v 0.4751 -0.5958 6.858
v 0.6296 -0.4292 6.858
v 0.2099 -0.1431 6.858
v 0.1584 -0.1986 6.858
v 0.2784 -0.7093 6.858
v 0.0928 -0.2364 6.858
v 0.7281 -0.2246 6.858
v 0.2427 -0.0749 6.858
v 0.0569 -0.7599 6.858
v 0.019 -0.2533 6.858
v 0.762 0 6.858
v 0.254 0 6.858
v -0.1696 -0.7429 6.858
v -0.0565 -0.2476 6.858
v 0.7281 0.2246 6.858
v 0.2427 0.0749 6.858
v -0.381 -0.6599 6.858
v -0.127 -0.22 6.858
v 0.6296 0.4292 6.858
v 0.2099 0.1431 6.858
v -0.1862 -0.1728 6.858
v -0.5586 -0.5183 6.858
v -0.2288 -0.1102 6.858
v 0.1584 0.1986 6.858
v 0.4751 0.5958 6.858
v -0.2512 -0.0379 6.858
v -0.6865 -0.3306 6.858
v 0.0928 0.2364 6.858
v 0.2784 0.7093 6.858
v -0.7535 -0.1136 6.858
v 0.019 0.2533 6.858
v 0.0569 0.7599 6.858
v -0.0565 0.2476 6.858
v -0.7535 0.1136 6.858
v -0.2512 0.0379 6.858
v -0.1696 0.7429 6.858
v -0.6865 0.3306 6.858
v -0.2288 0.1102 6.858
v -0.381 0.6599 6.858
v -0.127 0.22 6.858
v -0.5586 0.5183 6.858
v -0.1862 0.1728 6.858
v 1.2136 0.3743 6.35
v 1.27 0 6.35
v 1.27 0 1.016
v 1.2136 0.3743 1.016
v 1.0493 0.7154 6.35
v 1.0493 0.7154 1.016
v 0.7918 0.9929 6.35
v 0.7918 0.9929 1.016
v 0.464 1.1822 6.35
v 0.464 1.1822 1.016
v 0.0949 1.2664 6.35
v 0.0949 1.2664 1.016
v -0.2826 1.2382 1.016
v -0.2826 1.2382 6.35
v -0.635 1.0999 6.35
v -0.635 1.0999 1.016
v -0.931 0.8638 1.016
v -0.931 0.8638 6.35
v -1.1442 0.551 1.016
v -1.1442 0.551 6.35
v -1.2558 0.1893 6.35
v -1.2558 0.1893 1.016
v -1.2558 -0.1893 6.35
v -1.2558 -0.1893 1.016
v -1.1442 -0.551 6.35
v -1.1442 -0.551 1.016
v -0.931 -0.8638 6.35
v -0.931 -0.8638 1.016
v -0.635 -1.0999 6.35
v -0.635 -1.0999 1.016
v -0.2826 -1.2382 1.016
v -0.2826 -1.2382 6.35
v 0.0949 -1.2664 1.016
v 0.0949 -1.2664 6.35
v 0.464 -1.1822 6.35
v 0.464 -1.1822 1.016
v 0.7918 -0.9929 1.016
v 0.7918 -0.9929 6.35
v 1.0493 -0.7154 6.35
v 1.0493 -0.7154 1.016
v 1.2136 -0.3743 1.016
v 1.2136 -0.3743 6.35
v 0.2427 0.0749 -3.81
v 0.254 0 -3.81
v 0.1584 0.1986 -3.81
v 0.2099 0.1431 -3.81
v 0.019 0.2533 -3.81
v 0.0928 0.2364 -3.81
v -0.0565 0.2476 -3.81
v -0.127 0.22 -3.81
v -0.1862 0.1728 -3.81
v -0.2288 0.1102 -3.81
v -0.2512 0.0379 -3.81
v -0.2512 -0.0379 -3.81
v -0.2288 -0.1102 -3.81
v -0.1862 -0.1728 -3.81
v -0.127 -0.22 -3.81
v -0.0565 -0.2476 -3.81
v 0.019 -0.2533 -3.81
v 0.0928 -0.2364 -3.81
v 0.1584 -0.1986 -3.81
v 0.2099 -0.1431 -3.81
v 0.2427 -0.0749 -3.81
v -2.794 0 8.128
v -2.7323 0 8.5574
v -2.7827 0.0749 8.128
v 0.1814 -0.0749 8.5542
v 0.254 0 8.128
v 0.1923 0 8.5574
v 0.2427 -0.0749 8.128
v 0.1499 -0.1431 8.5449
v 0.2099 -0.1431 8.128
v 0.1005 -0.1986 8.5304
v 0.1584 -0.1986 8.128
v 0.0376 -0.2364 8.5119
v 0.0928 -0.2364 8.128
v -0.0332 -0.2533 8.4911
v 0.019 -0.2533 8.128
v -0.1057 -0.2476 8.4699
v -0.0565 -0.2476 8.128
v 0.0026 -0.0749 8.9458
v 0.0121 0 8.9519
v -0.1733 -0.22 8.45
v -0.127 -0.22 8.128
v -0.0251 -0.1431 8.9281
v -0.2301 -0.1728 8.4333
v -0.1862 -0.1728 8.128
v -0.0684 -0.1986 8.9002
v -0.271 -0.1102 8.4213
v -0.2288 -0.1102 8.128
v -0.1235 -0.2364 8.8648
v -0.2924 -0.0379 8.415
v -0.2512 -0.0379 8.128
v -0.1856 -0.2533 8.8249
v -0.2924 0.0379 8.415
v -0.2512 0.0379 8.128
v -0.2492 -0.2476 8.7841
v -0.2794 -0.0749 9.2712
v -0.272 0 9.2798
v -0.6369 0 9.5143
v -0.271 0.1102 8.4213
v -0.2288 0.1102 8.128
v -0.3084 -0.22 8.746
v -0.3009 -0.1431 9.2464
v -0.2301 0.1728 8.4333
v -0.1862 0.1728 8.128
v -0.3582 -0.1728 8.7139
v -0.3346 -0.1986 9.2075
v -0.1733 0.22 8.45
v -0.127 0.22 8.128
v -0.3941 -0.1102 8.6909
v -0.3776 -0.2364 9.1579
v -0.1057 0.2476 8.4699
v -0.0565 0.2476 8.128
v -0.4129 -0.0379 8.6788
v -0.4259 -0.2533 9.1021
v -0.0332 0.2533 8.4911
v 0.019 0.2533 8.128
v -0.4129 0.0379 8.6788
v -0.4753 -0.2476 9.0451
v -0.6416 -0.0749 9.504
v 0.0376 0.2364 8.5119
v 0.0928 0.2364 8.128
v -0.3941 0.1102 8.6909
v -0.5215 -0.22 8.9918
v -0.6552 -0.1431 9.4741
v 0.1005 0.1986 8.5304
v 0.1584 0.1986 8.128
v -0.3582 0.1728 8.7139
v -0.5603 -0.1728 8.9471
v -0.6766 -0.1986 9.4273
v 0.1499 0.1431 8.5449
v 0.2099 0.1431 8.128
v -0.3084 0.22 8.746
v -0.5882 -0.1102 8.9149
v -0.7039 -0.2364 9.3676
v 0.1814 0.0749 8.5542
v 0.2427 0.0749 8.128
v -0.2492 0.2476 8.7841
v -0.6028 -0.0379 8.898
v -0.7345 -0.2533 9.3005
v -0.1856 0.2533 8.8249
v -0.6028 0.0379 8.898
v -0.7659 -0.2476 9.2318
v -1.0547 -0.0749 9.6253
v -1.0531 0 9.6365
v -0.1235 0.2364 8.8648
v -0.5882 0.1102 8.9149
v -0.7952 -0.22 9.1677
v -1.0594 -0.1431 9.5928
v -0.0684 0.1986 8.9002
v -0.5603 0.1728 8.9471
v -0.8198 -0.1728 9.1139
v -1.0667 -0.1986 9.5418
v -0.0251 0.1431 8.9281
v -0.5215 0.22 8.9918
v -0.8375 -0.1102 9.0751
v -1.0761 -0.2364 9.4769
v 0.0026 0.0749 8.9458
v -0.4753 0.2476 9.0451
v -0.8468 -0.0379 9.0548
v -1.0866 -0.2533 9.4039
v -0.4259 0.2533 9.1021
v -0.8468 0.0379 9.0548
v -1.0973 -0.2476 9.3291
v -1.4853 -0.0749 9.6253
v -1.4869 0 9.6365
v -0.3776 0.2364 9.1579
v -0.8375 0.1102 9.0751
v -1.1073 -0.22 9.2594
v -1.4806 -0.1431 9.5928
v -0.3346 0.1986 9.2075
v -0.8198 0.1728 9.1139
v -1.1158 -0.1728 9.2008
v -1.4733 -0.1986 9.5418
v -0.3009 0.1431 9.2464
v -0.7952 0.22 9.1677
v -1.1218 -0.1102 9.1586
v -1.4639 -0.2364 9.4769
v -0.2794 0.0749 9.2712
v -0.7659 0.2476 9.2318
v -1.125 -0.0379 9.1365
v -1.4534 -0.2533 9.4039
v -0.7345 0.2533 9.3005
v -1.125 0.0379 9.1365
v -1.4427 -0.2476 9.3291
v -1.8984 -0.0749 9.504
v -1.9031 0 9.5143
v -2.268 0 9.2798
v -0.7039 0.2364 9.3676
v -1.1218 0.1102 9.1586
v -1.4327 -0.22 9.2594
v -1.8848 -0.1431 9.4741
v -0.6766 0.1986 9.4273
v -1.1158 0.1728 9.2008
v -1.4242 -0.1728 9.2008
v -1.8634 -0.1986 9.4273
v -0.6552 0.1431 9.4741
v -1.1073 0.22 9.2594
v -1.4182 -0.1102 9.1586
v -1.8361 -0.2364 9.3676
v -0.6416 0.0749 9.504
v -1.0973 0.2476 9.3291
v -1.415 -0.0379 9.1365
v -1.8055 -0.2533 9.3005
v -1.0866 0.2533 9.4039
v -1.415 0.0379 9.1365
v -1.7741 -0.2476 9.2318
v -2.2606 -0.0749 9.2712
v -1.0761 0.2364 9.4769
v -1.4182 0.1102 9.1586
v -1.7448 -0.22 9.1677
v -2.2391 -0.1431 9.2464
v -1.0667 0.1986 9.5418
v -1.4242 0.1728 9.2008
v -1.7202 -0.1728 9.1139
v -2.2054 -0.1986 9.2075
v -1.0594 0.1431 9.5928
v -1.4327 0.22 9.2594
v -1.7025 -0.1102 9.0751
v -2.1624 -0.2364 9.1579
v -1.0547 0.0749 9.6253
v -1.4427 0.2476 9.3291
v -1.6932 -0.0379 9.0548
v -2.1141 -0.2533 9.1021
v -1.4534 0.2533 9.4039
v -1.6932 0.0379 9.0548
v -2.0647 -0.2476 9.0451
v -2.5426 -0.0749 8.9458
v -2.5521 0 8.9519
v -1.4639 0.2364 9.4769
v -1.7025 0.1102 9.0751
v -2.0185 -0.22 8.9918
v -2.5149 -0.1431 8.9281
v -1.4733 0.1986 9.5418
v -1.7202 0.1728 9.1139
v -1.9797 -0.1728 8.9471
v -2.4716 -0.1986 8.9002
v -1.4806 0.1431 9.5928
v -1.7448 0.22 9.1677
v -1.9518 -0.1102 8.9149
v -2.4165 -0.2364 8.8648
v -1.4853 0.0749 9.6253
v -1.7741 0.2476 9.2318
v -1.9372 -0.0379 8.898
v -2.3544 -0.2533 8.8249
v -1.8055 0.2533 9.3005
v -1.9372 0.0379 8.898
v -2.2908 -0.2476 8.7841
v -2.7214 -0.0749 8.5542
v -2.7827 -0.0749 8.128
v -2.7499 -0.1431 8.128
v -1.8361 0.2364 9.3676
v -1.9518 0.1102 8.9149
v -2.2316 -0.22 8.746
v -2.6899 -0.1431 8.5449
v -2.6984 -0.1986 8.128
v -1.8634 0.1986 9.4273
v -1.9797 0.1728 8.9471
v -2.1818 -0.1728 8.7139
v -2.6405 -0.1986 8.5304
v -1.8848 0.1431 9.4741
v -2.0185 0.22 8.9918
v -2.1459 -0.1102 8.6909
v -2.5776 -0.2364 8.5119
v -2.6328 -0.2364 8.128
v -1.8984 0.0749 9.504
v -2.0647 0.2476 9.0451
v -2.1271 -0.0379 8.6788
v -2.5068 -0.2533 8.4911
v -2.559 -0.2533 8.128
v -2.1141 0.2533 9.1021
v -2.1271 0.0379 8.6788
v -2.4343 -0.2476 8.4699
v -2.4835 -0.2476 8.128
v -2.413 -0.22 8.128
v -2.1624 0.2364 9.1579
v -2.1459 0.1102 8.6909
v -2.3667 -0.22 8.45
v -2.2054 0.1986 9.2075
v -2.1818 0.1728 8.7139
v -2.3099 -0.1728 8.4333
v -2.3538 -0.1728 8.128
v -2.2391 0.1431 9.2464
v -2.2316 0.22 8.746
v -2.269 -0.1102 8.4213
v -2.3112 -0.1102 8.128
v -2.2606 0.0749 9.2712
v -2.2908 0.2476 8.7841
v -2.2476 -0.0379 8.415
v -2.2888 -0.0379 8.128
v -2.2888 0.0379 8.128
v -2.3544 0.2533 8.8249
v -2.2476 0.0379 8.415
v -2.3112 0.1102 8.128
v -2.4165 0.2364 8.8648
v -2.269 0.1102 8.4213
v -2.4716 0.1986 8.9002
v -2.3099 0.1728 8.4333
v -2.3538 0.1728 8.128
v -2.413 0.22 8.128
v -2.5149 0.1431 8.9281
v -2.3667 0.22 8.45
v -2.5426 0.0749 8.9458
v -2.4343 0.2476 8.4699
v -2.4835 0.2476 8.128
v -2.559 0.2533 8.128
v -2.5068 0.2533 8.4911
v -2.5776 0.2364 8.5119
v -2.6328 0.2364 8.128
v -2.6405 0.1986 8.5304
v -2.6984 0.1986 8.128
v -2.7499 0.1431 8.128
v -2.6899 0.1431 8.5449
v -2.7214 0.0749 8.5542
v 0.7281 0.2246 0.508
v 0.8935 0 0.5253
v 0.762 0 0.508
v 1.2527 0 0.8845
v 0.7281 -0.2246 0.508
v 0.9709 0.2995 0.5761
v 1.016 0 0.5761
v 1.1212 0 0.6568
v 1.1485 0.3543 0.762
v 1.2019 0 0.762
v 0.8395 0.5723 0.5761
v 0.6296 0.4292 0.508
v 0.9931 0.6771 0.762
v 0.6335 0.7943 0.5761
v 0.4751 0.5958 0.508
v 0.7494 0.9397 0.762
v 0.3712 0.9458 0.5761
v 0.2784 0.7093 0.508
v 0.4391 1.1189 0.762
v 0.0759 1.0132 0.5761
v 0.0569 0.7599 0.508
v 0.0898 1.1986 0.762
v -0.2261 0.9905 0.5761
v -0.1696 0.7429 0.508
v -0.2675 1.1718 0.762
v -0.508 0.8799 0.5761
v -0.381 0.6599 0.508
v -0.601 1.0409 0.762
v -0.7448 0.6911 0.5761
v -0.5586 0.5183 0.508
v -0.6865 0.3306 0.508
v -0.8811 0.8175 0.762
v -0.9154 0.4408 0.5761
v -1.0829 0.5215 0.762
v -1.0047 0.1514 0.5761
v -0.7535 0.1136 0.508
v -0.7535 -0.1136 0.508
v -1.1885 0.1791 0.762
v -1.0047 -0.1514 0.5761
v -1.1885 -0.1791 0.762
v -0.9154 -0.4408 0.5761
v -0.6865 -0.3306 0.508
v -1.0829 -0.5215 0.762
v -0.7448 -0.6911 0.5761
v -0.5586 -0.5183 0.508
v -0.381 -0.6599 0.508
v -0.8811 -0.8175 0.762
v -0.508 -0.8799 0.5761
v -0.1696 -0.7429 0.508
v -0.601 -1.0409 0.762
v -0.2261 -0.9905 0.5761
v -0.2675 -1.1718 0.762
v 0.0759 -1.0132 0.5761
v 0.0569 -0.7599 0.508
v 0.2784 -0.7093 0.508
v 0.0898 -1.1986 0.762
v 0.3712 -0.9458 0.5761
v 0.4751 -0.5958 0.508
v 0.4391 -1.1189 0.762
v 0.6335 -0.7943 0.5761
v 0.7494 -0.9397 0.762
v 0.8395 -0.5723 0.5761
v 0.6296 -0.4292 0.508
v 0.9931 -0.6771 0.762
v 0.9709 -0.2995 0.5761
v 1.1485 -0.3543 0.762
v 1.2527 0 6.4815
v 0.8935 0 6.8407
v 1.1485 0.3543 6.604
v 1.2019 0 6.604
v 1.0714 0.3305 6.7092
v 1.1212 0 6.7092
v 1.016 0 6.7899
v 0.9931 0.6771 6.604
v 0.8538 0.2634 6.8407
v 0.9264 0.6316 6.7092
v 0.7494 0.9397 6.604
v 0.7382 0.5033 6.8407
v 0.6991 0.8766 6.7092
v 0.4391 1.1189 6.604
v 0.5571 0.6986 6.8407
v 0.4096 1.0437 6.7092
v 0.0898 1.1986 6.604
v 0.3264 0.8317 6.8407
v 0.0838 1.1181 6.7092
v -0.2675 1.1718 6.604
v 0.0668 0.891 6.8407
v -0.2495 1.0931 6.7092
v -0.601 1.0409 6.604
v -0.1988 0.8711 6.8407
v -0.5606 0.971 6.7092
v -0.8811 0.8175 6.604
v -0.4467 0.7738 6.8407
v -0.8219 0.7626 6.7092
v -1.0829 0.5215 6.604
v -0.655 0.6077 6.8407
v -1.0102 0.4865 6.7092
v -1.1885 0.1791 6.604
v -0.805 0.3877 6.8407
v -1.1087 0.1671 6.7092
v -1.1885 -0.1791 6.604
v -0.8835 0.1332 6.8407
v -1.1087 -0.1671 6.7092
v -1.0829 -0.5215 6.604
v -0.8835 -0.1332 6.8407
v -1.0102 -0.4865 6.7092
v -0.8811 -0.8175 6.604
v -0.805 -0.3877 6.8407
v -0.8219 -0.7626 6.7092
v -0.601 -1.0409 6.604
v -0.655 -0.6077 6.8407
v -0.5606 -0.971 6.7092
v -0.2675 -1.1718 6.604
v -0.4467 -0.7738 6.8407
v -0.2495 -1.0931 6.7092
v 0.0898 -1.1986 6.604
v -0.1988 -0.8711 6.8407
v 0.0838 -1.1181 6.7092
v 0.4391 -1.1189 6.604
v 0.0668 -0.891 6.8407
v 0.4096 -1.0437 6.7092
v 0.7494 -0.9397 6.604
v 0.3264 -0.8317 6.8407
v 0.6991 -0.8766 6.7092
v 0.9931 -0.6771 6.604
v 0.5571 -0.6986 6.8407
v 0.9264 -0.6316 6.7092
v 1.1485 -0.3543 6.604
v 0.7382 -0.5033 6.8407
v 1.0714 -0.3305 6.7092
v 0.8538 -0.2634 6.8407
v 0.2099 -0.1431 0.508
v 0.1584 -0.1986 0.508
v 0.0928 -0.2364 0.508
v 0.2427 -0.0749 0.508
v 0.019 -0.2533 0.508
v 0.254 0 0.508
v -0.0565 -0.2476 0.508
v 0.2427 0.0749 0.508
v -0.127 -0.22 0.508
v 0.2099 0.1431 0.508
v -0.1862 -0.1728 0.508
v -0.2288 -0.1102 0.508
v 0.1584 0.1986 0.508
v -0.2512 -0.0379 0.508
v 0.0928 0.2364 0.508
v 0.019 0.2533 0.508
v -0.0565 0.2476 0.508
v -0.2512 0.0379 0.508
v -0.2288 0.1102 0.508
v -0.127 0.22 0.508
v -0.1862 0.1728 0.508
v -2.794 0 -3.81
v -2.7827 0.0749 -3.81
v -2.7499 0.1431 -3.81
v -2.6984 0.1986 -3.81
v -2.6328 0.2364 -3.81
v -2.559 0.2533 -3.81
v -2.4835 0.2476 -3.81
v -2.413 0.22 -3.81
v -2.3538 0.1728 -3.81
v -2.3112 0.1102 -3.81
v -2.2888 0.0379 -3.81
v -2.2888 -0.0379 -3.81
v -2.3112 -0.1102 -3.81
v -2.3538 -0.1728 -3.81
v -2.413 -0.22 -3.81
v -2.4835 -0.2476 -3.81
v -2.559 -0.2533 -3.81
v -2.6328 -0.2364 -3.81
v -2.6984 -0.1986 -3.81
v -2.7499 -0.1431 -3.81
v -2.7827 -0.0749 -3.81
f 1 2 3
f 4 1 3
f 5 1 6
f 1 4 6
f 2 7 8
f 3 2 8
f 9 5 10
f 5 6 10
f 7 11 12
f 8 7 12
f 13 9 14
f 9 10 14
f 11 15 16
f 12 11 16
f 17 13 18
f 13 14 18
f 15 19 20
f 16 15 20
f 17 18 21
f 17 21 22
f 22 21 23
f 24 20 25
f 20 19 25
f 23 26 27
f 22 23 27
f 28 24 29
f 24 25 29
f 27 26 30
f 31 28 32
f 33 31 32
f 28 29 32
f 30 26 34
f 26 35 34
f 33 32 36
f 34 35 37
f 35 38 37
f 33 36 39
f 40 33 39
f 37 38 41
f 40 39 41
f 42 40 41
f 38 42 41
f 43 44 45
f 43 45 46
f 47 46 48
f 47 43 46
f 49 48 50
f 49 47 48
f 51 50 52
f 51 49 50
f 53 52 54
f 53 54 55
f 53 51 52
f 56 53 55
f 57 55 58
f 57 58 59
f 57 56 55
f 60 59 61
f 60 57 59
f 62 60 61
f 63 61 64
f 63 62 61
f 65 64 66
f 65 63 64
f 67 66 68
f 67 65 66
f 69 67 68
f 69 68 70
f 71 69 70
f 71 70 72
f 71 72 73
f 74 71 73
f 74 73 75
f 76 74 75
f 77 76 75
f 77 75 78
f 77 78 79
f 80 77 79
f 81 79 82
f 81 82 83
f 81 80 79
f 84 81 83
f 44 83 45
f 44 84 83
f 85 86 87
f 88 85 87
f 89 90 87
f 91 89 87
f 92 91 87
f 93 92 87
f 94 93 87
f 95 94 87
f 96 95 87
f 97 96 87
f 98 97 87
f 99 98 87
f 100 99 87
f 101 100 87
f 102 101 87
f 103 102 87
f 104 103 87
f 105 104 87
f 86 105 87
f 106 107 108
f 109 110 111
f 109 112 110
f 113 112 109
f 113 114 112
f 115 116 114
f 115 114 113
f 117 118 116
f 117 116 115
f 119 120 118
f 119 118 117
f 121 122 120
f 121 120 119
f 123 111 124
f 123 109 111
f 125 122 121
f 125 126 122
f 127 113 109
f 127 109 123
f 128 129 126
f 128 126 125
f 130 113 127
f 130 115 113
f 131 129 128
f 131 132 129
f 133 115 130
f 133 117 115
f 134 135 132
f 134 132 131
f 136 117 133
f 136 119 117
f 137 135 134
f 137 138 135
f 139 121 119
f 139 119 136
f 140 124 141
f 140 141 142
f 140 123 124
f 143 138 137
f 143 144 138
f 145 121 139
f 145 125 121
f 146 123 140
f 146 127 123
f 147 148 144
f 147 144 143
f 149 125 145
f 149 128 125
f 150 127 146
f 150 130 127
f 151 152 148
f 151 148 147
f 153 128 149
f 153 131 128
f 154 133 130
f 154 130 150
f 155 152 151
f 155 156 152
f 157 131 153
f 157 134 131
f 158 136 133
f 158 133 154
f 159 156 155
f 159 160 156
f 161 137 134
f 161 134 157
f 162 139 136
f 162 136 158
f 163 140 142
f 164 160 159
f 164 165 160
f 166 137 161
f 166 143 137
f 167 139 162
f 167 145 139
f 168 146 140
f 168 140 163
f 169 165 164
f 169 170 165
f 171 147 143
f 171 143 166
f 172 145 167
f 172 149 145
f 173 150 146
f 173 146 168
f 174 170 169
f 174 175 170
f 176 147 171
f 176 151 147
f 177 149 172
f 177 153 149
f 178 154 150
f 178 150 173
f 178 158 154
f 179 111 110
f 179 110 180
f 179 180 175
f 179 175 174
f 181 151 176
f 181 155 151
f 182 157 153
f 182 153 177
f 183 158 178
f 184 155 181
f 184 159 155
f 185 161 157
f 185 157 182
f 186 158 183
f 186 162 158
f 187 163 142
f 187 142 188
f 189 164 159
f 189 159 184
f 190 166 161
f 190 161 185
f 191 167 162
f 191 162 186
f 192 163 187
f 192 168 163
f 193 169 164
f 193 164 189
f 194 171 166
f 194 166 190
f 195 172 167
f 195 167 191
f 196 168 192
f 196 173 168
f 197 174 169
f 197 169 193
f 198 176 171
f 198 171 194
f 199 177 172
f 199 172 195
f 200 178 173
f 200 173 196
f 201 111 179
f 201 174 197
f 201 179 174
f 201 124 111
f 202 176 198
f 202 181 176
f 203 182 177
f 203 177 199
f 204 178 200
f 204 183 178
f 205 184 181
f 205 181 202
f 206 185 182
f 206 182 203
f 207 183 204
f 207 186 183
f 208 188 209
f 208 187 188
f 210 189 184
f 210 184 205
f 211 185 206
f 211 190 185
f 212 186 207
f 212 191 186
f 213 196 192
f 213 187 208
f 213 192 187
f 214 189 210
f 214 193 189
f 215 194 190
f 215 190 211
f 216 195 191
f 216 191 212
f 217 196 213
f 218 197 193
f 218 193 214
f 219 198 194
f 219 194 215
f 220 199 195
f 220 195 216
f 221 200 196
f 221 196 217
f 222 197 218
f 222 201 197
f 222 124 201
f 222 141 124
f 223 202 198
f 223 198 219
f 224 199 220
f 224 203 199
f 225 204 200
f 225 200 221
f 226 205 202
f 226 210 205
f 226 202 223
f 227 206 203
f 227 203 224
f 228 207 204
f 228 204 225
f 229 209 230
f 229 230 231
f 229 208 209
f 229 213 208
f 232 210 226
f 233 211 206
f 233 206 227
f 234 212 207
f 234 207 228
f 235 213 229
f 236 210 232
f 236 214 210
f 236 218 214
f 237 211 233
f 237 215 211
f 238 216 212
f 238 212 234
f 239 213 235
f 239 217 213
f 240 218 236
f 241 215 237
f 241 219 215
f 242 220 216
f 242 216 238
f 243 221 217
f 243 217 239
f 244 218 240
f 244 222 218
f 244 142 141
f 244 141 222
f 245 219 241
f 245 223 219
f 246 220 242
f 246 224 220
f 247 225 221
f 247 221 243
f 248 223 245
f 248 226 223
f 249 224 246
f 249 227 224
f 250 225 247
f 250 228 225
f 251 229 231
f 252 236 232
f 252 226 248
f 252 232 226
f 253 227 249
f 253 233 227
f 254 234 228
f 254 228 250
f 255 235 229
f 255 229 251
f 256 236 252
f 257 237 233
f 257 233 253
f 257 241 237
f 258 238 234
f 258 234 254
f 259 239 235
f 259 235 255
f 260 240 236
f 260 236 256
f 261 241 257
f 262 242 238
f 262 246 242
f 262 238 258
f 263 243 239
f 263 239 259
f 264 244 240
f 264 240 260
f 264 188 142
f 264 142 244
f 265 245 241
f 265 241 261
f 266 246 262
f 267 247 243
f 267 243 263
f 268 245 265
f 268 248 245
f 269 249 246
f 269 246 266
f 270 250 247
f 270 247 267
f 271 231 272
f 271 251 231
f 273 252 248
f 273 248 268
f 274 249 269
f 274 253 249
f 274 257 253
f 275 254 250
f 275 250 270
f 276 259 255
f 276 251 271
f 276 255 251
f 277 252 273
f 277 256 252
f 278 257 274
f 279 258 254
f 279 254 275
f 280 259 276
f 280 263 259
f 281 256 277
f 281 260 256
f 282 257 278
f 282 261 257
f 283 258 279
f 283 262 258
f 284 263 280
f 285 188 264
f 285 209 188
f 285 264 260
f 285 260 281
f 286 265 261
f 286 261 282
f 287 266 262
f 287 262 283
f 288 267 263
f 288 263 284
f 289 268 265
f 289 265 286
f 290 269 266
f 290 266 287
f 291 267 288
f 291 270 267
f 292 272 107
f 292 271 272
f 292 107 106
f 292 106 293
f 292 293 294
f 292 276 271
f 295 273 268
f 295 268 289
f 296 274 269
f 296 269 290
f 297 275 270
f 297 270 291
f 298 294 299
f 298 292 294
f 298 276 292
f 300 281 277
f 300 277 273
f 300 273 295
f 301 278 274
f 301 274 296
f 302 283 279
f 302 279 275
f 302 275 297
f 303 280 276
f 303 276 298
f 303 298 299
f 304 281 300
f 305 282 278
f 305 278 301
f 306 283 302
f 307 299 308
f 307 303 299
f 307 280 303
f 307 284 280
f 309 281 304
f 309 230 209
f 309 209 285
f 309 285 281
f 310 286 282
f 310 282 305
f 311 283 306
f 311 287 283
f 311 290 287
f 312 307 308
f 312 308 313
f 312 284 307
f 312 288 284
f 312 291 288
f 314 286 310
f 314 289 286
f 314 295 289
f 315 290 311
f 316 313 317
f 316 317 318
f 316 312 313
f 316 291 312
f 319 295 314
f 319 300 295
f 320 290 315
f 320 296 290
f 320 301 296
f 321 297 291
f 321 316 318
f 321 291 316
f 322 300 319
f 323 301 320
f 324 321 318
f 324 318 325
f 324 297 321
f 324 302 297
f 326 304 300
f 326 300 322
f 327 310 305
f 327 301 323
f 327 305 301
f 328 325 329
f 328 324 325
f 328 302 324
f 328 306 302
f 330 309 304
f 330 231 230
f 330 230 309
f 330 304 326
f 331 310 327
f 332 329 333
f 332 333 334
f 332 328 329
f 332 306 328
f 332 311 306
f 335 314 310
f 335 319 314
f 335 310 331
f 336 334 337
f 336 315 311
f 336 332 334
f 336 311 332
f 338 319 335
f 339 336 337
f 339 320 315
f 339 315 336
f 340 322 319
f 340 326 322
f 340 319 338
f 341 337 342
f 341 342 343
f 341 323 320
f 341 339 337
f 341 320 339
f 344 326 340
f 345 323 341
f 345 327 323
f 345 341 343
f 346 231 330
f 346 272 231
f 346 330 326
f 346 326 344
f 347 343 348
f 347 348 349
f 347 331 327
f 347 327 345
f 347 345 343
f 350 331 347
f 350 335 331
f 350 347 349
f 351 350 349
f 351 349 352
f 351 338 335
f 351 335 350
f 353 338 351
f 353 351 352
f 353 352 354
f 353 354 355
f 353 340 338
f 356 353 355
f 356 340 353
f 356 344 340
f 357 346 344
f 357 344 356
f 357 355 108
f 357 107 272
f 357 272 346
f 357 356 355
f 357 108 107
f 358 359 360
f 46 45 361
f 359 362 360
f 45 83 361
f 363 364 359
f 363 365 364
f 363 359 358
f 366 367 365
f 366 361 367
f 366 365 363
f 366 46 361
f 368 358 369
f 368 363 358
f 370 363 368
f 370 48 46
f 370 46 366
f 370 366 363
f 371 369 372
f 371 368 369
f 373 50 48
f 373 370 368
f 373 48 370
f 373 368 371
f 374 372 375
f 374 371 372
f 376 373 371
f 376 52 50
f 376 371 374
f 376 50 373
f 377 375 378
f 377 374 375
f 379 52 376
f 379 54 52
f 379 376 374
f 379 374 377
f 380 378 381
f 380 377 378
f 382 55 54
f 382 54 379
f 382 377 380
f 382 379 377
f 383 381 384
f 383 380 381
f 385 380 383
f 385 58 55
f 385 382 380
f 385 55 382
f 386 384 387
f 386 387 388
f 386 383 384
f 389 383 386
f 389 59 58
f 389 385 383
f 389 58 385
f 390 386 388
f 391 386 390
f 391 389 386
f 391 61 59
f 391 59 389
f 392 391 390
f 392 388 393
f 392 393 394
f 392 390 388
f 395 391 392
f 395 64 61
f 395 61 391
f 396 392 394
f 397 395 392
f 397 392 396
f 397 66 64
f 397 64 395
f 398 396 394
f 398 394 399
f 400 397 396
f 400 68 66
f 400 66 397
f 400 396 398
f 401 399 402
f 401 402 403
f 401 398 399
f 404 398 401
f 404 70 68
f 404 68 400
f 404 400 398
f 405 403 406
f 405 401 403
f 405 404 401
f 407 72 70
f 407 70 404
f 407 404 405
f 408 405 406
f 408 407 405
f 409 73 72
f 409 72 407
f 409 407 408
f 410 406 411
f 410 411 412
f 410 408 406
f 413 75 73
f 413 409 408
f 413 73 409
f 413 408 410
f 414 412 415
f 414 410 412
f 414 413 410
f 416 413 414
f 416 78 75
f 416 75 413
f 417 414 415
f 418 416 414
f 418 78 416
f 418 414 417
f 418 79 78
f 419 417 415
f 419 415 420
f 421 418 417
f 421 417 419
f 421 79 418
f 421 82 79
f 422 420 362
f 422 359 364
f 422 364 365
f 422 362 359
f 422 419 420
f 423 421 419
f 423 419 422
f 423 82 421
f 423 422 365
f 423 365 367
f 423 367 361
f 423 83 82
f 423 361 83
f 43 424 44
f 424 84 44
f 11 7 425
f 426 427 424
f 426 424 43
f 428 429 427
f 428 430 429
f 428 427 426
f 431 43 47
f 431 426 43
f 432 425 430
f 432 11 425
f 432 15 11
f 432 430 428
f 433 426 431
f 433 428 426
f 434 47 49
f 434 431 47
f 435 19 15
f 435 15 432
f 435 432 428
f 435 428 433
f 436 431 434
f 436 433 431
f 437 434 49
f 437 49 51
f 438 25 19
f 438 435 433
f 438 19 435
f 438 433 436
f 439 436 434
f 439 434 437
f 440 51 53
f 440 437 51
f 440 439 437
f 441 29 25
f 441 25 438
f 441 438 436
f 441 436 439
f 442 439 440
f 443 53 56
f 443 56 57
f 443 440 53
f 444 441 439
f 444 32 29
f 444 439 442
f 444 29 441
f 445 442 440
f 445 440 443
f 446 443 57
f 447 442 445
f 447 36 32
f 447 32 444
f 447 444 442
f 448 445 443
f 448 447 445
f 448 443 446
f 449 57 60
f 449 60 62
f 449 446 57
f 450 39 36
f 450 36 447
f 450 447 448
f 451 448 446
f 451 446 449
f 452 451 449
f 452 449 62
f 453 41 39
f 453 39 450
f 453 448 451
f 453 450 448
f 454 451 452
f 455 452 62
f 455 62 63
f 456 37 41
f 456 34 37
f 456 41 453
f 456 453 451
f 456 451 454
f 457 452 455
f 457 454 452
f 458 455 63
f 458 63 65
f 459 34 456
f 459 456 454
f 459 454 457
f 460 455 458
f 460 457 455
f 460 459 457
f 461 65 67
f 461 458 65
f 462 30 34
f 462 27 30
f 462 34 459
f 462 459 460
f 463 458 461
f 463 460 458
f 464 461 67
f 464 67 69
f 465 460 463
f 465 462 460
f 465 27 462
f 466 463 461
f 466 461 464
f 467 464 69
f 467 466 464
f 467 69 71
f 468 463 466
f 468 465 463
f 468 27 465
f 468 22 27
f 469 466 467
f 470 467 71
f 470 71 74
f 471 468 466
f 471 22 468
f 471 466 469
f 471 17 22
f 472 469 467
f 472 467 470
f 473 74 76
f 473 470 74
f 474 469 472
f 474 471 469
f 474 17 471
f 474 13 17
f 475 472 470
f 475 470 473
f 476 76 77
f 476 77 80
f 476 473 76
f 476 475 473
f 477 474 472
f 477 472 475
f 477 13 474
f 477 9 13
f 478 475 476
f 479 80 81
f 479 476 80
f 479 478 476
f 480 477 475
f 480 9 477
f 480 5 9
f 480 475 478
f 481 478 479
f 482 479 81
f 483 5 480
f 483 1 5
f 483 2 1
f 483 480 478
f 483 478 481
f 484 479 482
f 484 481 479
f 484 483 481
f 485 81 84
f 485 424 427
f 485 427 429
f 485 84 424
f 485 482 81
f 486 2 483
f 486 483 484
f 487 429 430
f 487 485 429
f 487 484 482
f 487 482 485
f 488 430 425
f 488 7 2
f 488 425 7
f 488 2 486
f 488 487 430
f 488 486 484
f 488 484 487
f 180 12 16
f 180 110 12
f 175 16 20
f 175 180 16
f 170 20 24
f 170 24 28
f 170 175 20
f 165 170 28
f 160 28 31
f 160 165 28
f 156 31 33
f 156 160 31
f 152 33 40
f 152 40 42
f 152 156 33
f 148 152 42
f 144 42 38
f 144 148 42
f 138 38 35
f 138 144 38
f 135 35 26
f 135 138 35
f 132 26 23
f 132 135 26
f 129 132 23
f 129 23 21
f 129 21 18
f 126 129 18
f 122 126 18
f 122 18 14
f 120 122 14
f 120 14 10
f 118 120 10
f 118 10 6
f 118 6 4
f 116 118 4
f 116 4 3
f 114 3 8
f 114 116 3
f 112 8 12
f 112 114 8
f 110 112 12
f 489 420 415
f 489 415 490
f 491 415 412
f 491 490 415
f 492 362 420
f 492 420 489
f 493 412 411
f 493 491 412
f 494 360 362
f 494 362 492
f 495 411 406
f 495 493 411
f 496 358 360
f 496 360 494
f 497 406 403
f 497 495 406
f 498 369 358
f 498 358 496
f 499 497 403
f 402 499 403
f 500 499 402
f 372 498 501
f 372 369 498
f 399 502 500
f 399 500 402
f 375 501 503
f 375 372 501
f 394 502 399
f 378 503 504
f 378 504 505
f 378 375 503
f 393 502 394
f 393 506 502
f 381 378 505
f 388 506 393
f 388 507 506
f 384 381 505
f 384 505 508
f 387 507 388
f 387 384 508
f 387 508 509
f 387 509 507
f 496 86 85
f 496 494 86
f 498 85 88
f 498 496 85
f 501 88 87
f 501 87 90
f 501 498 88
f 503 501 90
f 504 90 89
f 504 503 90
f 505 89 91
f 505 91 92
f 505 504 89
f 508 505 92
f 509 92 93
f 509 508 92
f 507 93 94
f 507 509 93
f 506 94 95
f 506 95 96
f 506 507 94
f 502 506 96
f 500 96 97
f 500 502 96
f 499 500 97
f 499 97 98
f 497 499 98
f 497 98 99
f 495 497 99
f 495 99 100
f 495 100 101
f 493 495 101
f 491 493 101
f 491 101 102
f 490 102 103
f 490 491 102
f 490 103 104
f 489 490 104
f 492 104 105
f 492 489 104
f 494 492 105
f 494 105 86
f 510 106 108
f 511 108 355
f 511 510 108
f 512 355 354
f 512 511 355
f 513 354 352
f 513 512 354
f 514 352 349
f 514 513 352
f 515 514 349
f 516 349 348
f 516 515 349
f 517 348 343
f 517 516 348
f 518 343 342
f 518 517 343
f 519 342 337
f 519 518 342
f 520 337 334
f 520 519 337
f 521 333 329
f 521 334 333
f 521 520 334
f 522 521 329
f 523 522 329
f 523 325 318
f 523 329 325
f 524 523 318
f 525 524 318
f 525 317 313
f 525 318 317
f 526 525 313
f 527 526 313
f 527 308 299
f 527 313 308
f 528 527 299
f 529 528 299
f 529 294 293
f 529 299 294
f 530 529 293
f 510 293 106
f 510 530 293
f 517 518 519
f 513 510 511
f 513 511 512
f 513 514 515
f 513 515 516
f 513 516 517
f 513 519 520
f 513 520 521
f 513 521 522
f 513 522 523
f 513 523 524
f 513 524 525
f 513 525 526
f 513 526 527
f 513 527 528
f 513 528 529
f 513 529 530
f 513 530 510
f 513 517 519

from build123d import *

# Parameters (mm, degrees)
F0_W = 1.27
F0_H = 6.35
F2_R = 0.508
F5_R = 0.254


with BuildPart() as f1:
    # F0 (on Front) → F1 (revolve)
    with BuildSketch(Plane.XZ):
        with Locations((0.635, 3.683)):
            Rectangle(F0_W, F0_H)
    revolve(axis=Axis((0, 0, 3.683), (0, 0, 1)))

    # F2
    f2_edges = [f1.edges().sort_by_distance(p)[0] for p in [
        (-1.27, 0, 6.858),
        (-1.27, 0, 0.508),
    ]]
    fillet(f2_edges, radius=F2_R)

    # F6: sweep along a path in F3
    with BuildLine(Plane.XZ) as f6_path:
        Line((0, -3.81), (0, 8.128))
        ThreePointArc((0, 8.128), (-1.27, 9.398), (-2.54, 8.128))
        Line((-2.54, 8.128), (-2.54, -3.81))
    # F5 (on offset) → F6 (sweep)
    with BuildSketch(Plane.XY.offset(-3.81)):
        Circle(F5_R)
    sweep(path=f6_path.line)


solid = f1.part
